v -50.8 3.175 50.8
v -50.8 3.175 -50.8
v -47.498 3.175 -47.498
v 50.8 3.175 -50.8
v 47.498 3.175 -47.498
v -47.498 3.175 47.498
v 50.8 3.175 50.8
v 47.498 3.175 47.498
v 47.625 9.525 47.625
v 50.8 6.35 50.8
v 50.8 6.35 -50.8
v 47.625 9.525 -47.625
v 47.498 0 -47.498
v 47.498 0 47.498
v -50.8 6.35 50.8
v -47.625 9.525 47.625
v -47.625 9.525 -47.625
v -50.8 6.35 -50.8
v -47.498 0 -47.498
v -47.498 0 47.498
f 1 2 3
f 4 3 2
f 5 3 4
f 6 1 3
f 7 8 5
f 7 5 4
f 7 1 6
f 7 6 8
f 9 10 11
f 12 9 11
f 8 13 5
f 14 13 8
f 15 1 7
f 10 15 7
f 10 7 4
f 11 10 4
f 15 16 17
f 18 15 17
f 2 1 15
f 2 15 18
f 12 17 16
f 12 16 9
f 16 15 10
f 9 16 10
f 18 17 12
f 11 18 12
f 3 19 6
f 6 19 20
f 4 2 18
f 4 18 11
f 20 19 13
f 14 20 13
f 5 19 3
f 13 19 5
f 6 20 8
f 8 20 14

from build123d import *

# Parameters (mm, degrees)
SKETCH1_W           = 101.6
SKETCH1_H           = 101.6
BOSS_EXTRUDE1_DEPTH = 9.525
SKETCH2_W           = 101.6
SKETCH2_H           = 101.6
SKETCH2_W_2         = 94.996
SKETCH2_H_2         = 94.996
CUT_EXTRUDE1_DEPTH  = 3.175
CHAMFER1_SIZE       = 3.175


with BuildPart() as part:
    # Sketch1 → Boss-Extrude1 (new body)
    with BuildSketch(Plane(origin=(0, 0, 0), x_dir=(1, 0, 0), z_dir=(0, 1, 0))):
        Rectangle(SKETCH1_W, SKETCH1_H)
    extrude(amount=BOSS_EXTRUDE1_DEPTH)

    # Sketch2 → Cut-Extrude1 (cut)
    with BuildSketch(Plane.XZ):
        Rectangle(SKETCH2_W, SKETCH2_H)
        Rectangle(SKETCH2_W_2, SKETCH2_H_2, mode=Mode.SUBTRACT)
    extrude(amount=-CUT_EXTRUDE1_DEPTH, mode=Mode.SUBTRACT)

    # Chamfer1
    chamfer1_edges = [part.edges().sort_by_distance(p)[0] for p in [
        (-50.8, 9.525, 0),
        (0, 9.525, 50.8),
        (50.8, 9.525, 0),
        (0, 9.525, -50.8),
    ]]
    chamfer(chamfer1_edges, length=CHAMFER1_SIZE)


solid = part.part
